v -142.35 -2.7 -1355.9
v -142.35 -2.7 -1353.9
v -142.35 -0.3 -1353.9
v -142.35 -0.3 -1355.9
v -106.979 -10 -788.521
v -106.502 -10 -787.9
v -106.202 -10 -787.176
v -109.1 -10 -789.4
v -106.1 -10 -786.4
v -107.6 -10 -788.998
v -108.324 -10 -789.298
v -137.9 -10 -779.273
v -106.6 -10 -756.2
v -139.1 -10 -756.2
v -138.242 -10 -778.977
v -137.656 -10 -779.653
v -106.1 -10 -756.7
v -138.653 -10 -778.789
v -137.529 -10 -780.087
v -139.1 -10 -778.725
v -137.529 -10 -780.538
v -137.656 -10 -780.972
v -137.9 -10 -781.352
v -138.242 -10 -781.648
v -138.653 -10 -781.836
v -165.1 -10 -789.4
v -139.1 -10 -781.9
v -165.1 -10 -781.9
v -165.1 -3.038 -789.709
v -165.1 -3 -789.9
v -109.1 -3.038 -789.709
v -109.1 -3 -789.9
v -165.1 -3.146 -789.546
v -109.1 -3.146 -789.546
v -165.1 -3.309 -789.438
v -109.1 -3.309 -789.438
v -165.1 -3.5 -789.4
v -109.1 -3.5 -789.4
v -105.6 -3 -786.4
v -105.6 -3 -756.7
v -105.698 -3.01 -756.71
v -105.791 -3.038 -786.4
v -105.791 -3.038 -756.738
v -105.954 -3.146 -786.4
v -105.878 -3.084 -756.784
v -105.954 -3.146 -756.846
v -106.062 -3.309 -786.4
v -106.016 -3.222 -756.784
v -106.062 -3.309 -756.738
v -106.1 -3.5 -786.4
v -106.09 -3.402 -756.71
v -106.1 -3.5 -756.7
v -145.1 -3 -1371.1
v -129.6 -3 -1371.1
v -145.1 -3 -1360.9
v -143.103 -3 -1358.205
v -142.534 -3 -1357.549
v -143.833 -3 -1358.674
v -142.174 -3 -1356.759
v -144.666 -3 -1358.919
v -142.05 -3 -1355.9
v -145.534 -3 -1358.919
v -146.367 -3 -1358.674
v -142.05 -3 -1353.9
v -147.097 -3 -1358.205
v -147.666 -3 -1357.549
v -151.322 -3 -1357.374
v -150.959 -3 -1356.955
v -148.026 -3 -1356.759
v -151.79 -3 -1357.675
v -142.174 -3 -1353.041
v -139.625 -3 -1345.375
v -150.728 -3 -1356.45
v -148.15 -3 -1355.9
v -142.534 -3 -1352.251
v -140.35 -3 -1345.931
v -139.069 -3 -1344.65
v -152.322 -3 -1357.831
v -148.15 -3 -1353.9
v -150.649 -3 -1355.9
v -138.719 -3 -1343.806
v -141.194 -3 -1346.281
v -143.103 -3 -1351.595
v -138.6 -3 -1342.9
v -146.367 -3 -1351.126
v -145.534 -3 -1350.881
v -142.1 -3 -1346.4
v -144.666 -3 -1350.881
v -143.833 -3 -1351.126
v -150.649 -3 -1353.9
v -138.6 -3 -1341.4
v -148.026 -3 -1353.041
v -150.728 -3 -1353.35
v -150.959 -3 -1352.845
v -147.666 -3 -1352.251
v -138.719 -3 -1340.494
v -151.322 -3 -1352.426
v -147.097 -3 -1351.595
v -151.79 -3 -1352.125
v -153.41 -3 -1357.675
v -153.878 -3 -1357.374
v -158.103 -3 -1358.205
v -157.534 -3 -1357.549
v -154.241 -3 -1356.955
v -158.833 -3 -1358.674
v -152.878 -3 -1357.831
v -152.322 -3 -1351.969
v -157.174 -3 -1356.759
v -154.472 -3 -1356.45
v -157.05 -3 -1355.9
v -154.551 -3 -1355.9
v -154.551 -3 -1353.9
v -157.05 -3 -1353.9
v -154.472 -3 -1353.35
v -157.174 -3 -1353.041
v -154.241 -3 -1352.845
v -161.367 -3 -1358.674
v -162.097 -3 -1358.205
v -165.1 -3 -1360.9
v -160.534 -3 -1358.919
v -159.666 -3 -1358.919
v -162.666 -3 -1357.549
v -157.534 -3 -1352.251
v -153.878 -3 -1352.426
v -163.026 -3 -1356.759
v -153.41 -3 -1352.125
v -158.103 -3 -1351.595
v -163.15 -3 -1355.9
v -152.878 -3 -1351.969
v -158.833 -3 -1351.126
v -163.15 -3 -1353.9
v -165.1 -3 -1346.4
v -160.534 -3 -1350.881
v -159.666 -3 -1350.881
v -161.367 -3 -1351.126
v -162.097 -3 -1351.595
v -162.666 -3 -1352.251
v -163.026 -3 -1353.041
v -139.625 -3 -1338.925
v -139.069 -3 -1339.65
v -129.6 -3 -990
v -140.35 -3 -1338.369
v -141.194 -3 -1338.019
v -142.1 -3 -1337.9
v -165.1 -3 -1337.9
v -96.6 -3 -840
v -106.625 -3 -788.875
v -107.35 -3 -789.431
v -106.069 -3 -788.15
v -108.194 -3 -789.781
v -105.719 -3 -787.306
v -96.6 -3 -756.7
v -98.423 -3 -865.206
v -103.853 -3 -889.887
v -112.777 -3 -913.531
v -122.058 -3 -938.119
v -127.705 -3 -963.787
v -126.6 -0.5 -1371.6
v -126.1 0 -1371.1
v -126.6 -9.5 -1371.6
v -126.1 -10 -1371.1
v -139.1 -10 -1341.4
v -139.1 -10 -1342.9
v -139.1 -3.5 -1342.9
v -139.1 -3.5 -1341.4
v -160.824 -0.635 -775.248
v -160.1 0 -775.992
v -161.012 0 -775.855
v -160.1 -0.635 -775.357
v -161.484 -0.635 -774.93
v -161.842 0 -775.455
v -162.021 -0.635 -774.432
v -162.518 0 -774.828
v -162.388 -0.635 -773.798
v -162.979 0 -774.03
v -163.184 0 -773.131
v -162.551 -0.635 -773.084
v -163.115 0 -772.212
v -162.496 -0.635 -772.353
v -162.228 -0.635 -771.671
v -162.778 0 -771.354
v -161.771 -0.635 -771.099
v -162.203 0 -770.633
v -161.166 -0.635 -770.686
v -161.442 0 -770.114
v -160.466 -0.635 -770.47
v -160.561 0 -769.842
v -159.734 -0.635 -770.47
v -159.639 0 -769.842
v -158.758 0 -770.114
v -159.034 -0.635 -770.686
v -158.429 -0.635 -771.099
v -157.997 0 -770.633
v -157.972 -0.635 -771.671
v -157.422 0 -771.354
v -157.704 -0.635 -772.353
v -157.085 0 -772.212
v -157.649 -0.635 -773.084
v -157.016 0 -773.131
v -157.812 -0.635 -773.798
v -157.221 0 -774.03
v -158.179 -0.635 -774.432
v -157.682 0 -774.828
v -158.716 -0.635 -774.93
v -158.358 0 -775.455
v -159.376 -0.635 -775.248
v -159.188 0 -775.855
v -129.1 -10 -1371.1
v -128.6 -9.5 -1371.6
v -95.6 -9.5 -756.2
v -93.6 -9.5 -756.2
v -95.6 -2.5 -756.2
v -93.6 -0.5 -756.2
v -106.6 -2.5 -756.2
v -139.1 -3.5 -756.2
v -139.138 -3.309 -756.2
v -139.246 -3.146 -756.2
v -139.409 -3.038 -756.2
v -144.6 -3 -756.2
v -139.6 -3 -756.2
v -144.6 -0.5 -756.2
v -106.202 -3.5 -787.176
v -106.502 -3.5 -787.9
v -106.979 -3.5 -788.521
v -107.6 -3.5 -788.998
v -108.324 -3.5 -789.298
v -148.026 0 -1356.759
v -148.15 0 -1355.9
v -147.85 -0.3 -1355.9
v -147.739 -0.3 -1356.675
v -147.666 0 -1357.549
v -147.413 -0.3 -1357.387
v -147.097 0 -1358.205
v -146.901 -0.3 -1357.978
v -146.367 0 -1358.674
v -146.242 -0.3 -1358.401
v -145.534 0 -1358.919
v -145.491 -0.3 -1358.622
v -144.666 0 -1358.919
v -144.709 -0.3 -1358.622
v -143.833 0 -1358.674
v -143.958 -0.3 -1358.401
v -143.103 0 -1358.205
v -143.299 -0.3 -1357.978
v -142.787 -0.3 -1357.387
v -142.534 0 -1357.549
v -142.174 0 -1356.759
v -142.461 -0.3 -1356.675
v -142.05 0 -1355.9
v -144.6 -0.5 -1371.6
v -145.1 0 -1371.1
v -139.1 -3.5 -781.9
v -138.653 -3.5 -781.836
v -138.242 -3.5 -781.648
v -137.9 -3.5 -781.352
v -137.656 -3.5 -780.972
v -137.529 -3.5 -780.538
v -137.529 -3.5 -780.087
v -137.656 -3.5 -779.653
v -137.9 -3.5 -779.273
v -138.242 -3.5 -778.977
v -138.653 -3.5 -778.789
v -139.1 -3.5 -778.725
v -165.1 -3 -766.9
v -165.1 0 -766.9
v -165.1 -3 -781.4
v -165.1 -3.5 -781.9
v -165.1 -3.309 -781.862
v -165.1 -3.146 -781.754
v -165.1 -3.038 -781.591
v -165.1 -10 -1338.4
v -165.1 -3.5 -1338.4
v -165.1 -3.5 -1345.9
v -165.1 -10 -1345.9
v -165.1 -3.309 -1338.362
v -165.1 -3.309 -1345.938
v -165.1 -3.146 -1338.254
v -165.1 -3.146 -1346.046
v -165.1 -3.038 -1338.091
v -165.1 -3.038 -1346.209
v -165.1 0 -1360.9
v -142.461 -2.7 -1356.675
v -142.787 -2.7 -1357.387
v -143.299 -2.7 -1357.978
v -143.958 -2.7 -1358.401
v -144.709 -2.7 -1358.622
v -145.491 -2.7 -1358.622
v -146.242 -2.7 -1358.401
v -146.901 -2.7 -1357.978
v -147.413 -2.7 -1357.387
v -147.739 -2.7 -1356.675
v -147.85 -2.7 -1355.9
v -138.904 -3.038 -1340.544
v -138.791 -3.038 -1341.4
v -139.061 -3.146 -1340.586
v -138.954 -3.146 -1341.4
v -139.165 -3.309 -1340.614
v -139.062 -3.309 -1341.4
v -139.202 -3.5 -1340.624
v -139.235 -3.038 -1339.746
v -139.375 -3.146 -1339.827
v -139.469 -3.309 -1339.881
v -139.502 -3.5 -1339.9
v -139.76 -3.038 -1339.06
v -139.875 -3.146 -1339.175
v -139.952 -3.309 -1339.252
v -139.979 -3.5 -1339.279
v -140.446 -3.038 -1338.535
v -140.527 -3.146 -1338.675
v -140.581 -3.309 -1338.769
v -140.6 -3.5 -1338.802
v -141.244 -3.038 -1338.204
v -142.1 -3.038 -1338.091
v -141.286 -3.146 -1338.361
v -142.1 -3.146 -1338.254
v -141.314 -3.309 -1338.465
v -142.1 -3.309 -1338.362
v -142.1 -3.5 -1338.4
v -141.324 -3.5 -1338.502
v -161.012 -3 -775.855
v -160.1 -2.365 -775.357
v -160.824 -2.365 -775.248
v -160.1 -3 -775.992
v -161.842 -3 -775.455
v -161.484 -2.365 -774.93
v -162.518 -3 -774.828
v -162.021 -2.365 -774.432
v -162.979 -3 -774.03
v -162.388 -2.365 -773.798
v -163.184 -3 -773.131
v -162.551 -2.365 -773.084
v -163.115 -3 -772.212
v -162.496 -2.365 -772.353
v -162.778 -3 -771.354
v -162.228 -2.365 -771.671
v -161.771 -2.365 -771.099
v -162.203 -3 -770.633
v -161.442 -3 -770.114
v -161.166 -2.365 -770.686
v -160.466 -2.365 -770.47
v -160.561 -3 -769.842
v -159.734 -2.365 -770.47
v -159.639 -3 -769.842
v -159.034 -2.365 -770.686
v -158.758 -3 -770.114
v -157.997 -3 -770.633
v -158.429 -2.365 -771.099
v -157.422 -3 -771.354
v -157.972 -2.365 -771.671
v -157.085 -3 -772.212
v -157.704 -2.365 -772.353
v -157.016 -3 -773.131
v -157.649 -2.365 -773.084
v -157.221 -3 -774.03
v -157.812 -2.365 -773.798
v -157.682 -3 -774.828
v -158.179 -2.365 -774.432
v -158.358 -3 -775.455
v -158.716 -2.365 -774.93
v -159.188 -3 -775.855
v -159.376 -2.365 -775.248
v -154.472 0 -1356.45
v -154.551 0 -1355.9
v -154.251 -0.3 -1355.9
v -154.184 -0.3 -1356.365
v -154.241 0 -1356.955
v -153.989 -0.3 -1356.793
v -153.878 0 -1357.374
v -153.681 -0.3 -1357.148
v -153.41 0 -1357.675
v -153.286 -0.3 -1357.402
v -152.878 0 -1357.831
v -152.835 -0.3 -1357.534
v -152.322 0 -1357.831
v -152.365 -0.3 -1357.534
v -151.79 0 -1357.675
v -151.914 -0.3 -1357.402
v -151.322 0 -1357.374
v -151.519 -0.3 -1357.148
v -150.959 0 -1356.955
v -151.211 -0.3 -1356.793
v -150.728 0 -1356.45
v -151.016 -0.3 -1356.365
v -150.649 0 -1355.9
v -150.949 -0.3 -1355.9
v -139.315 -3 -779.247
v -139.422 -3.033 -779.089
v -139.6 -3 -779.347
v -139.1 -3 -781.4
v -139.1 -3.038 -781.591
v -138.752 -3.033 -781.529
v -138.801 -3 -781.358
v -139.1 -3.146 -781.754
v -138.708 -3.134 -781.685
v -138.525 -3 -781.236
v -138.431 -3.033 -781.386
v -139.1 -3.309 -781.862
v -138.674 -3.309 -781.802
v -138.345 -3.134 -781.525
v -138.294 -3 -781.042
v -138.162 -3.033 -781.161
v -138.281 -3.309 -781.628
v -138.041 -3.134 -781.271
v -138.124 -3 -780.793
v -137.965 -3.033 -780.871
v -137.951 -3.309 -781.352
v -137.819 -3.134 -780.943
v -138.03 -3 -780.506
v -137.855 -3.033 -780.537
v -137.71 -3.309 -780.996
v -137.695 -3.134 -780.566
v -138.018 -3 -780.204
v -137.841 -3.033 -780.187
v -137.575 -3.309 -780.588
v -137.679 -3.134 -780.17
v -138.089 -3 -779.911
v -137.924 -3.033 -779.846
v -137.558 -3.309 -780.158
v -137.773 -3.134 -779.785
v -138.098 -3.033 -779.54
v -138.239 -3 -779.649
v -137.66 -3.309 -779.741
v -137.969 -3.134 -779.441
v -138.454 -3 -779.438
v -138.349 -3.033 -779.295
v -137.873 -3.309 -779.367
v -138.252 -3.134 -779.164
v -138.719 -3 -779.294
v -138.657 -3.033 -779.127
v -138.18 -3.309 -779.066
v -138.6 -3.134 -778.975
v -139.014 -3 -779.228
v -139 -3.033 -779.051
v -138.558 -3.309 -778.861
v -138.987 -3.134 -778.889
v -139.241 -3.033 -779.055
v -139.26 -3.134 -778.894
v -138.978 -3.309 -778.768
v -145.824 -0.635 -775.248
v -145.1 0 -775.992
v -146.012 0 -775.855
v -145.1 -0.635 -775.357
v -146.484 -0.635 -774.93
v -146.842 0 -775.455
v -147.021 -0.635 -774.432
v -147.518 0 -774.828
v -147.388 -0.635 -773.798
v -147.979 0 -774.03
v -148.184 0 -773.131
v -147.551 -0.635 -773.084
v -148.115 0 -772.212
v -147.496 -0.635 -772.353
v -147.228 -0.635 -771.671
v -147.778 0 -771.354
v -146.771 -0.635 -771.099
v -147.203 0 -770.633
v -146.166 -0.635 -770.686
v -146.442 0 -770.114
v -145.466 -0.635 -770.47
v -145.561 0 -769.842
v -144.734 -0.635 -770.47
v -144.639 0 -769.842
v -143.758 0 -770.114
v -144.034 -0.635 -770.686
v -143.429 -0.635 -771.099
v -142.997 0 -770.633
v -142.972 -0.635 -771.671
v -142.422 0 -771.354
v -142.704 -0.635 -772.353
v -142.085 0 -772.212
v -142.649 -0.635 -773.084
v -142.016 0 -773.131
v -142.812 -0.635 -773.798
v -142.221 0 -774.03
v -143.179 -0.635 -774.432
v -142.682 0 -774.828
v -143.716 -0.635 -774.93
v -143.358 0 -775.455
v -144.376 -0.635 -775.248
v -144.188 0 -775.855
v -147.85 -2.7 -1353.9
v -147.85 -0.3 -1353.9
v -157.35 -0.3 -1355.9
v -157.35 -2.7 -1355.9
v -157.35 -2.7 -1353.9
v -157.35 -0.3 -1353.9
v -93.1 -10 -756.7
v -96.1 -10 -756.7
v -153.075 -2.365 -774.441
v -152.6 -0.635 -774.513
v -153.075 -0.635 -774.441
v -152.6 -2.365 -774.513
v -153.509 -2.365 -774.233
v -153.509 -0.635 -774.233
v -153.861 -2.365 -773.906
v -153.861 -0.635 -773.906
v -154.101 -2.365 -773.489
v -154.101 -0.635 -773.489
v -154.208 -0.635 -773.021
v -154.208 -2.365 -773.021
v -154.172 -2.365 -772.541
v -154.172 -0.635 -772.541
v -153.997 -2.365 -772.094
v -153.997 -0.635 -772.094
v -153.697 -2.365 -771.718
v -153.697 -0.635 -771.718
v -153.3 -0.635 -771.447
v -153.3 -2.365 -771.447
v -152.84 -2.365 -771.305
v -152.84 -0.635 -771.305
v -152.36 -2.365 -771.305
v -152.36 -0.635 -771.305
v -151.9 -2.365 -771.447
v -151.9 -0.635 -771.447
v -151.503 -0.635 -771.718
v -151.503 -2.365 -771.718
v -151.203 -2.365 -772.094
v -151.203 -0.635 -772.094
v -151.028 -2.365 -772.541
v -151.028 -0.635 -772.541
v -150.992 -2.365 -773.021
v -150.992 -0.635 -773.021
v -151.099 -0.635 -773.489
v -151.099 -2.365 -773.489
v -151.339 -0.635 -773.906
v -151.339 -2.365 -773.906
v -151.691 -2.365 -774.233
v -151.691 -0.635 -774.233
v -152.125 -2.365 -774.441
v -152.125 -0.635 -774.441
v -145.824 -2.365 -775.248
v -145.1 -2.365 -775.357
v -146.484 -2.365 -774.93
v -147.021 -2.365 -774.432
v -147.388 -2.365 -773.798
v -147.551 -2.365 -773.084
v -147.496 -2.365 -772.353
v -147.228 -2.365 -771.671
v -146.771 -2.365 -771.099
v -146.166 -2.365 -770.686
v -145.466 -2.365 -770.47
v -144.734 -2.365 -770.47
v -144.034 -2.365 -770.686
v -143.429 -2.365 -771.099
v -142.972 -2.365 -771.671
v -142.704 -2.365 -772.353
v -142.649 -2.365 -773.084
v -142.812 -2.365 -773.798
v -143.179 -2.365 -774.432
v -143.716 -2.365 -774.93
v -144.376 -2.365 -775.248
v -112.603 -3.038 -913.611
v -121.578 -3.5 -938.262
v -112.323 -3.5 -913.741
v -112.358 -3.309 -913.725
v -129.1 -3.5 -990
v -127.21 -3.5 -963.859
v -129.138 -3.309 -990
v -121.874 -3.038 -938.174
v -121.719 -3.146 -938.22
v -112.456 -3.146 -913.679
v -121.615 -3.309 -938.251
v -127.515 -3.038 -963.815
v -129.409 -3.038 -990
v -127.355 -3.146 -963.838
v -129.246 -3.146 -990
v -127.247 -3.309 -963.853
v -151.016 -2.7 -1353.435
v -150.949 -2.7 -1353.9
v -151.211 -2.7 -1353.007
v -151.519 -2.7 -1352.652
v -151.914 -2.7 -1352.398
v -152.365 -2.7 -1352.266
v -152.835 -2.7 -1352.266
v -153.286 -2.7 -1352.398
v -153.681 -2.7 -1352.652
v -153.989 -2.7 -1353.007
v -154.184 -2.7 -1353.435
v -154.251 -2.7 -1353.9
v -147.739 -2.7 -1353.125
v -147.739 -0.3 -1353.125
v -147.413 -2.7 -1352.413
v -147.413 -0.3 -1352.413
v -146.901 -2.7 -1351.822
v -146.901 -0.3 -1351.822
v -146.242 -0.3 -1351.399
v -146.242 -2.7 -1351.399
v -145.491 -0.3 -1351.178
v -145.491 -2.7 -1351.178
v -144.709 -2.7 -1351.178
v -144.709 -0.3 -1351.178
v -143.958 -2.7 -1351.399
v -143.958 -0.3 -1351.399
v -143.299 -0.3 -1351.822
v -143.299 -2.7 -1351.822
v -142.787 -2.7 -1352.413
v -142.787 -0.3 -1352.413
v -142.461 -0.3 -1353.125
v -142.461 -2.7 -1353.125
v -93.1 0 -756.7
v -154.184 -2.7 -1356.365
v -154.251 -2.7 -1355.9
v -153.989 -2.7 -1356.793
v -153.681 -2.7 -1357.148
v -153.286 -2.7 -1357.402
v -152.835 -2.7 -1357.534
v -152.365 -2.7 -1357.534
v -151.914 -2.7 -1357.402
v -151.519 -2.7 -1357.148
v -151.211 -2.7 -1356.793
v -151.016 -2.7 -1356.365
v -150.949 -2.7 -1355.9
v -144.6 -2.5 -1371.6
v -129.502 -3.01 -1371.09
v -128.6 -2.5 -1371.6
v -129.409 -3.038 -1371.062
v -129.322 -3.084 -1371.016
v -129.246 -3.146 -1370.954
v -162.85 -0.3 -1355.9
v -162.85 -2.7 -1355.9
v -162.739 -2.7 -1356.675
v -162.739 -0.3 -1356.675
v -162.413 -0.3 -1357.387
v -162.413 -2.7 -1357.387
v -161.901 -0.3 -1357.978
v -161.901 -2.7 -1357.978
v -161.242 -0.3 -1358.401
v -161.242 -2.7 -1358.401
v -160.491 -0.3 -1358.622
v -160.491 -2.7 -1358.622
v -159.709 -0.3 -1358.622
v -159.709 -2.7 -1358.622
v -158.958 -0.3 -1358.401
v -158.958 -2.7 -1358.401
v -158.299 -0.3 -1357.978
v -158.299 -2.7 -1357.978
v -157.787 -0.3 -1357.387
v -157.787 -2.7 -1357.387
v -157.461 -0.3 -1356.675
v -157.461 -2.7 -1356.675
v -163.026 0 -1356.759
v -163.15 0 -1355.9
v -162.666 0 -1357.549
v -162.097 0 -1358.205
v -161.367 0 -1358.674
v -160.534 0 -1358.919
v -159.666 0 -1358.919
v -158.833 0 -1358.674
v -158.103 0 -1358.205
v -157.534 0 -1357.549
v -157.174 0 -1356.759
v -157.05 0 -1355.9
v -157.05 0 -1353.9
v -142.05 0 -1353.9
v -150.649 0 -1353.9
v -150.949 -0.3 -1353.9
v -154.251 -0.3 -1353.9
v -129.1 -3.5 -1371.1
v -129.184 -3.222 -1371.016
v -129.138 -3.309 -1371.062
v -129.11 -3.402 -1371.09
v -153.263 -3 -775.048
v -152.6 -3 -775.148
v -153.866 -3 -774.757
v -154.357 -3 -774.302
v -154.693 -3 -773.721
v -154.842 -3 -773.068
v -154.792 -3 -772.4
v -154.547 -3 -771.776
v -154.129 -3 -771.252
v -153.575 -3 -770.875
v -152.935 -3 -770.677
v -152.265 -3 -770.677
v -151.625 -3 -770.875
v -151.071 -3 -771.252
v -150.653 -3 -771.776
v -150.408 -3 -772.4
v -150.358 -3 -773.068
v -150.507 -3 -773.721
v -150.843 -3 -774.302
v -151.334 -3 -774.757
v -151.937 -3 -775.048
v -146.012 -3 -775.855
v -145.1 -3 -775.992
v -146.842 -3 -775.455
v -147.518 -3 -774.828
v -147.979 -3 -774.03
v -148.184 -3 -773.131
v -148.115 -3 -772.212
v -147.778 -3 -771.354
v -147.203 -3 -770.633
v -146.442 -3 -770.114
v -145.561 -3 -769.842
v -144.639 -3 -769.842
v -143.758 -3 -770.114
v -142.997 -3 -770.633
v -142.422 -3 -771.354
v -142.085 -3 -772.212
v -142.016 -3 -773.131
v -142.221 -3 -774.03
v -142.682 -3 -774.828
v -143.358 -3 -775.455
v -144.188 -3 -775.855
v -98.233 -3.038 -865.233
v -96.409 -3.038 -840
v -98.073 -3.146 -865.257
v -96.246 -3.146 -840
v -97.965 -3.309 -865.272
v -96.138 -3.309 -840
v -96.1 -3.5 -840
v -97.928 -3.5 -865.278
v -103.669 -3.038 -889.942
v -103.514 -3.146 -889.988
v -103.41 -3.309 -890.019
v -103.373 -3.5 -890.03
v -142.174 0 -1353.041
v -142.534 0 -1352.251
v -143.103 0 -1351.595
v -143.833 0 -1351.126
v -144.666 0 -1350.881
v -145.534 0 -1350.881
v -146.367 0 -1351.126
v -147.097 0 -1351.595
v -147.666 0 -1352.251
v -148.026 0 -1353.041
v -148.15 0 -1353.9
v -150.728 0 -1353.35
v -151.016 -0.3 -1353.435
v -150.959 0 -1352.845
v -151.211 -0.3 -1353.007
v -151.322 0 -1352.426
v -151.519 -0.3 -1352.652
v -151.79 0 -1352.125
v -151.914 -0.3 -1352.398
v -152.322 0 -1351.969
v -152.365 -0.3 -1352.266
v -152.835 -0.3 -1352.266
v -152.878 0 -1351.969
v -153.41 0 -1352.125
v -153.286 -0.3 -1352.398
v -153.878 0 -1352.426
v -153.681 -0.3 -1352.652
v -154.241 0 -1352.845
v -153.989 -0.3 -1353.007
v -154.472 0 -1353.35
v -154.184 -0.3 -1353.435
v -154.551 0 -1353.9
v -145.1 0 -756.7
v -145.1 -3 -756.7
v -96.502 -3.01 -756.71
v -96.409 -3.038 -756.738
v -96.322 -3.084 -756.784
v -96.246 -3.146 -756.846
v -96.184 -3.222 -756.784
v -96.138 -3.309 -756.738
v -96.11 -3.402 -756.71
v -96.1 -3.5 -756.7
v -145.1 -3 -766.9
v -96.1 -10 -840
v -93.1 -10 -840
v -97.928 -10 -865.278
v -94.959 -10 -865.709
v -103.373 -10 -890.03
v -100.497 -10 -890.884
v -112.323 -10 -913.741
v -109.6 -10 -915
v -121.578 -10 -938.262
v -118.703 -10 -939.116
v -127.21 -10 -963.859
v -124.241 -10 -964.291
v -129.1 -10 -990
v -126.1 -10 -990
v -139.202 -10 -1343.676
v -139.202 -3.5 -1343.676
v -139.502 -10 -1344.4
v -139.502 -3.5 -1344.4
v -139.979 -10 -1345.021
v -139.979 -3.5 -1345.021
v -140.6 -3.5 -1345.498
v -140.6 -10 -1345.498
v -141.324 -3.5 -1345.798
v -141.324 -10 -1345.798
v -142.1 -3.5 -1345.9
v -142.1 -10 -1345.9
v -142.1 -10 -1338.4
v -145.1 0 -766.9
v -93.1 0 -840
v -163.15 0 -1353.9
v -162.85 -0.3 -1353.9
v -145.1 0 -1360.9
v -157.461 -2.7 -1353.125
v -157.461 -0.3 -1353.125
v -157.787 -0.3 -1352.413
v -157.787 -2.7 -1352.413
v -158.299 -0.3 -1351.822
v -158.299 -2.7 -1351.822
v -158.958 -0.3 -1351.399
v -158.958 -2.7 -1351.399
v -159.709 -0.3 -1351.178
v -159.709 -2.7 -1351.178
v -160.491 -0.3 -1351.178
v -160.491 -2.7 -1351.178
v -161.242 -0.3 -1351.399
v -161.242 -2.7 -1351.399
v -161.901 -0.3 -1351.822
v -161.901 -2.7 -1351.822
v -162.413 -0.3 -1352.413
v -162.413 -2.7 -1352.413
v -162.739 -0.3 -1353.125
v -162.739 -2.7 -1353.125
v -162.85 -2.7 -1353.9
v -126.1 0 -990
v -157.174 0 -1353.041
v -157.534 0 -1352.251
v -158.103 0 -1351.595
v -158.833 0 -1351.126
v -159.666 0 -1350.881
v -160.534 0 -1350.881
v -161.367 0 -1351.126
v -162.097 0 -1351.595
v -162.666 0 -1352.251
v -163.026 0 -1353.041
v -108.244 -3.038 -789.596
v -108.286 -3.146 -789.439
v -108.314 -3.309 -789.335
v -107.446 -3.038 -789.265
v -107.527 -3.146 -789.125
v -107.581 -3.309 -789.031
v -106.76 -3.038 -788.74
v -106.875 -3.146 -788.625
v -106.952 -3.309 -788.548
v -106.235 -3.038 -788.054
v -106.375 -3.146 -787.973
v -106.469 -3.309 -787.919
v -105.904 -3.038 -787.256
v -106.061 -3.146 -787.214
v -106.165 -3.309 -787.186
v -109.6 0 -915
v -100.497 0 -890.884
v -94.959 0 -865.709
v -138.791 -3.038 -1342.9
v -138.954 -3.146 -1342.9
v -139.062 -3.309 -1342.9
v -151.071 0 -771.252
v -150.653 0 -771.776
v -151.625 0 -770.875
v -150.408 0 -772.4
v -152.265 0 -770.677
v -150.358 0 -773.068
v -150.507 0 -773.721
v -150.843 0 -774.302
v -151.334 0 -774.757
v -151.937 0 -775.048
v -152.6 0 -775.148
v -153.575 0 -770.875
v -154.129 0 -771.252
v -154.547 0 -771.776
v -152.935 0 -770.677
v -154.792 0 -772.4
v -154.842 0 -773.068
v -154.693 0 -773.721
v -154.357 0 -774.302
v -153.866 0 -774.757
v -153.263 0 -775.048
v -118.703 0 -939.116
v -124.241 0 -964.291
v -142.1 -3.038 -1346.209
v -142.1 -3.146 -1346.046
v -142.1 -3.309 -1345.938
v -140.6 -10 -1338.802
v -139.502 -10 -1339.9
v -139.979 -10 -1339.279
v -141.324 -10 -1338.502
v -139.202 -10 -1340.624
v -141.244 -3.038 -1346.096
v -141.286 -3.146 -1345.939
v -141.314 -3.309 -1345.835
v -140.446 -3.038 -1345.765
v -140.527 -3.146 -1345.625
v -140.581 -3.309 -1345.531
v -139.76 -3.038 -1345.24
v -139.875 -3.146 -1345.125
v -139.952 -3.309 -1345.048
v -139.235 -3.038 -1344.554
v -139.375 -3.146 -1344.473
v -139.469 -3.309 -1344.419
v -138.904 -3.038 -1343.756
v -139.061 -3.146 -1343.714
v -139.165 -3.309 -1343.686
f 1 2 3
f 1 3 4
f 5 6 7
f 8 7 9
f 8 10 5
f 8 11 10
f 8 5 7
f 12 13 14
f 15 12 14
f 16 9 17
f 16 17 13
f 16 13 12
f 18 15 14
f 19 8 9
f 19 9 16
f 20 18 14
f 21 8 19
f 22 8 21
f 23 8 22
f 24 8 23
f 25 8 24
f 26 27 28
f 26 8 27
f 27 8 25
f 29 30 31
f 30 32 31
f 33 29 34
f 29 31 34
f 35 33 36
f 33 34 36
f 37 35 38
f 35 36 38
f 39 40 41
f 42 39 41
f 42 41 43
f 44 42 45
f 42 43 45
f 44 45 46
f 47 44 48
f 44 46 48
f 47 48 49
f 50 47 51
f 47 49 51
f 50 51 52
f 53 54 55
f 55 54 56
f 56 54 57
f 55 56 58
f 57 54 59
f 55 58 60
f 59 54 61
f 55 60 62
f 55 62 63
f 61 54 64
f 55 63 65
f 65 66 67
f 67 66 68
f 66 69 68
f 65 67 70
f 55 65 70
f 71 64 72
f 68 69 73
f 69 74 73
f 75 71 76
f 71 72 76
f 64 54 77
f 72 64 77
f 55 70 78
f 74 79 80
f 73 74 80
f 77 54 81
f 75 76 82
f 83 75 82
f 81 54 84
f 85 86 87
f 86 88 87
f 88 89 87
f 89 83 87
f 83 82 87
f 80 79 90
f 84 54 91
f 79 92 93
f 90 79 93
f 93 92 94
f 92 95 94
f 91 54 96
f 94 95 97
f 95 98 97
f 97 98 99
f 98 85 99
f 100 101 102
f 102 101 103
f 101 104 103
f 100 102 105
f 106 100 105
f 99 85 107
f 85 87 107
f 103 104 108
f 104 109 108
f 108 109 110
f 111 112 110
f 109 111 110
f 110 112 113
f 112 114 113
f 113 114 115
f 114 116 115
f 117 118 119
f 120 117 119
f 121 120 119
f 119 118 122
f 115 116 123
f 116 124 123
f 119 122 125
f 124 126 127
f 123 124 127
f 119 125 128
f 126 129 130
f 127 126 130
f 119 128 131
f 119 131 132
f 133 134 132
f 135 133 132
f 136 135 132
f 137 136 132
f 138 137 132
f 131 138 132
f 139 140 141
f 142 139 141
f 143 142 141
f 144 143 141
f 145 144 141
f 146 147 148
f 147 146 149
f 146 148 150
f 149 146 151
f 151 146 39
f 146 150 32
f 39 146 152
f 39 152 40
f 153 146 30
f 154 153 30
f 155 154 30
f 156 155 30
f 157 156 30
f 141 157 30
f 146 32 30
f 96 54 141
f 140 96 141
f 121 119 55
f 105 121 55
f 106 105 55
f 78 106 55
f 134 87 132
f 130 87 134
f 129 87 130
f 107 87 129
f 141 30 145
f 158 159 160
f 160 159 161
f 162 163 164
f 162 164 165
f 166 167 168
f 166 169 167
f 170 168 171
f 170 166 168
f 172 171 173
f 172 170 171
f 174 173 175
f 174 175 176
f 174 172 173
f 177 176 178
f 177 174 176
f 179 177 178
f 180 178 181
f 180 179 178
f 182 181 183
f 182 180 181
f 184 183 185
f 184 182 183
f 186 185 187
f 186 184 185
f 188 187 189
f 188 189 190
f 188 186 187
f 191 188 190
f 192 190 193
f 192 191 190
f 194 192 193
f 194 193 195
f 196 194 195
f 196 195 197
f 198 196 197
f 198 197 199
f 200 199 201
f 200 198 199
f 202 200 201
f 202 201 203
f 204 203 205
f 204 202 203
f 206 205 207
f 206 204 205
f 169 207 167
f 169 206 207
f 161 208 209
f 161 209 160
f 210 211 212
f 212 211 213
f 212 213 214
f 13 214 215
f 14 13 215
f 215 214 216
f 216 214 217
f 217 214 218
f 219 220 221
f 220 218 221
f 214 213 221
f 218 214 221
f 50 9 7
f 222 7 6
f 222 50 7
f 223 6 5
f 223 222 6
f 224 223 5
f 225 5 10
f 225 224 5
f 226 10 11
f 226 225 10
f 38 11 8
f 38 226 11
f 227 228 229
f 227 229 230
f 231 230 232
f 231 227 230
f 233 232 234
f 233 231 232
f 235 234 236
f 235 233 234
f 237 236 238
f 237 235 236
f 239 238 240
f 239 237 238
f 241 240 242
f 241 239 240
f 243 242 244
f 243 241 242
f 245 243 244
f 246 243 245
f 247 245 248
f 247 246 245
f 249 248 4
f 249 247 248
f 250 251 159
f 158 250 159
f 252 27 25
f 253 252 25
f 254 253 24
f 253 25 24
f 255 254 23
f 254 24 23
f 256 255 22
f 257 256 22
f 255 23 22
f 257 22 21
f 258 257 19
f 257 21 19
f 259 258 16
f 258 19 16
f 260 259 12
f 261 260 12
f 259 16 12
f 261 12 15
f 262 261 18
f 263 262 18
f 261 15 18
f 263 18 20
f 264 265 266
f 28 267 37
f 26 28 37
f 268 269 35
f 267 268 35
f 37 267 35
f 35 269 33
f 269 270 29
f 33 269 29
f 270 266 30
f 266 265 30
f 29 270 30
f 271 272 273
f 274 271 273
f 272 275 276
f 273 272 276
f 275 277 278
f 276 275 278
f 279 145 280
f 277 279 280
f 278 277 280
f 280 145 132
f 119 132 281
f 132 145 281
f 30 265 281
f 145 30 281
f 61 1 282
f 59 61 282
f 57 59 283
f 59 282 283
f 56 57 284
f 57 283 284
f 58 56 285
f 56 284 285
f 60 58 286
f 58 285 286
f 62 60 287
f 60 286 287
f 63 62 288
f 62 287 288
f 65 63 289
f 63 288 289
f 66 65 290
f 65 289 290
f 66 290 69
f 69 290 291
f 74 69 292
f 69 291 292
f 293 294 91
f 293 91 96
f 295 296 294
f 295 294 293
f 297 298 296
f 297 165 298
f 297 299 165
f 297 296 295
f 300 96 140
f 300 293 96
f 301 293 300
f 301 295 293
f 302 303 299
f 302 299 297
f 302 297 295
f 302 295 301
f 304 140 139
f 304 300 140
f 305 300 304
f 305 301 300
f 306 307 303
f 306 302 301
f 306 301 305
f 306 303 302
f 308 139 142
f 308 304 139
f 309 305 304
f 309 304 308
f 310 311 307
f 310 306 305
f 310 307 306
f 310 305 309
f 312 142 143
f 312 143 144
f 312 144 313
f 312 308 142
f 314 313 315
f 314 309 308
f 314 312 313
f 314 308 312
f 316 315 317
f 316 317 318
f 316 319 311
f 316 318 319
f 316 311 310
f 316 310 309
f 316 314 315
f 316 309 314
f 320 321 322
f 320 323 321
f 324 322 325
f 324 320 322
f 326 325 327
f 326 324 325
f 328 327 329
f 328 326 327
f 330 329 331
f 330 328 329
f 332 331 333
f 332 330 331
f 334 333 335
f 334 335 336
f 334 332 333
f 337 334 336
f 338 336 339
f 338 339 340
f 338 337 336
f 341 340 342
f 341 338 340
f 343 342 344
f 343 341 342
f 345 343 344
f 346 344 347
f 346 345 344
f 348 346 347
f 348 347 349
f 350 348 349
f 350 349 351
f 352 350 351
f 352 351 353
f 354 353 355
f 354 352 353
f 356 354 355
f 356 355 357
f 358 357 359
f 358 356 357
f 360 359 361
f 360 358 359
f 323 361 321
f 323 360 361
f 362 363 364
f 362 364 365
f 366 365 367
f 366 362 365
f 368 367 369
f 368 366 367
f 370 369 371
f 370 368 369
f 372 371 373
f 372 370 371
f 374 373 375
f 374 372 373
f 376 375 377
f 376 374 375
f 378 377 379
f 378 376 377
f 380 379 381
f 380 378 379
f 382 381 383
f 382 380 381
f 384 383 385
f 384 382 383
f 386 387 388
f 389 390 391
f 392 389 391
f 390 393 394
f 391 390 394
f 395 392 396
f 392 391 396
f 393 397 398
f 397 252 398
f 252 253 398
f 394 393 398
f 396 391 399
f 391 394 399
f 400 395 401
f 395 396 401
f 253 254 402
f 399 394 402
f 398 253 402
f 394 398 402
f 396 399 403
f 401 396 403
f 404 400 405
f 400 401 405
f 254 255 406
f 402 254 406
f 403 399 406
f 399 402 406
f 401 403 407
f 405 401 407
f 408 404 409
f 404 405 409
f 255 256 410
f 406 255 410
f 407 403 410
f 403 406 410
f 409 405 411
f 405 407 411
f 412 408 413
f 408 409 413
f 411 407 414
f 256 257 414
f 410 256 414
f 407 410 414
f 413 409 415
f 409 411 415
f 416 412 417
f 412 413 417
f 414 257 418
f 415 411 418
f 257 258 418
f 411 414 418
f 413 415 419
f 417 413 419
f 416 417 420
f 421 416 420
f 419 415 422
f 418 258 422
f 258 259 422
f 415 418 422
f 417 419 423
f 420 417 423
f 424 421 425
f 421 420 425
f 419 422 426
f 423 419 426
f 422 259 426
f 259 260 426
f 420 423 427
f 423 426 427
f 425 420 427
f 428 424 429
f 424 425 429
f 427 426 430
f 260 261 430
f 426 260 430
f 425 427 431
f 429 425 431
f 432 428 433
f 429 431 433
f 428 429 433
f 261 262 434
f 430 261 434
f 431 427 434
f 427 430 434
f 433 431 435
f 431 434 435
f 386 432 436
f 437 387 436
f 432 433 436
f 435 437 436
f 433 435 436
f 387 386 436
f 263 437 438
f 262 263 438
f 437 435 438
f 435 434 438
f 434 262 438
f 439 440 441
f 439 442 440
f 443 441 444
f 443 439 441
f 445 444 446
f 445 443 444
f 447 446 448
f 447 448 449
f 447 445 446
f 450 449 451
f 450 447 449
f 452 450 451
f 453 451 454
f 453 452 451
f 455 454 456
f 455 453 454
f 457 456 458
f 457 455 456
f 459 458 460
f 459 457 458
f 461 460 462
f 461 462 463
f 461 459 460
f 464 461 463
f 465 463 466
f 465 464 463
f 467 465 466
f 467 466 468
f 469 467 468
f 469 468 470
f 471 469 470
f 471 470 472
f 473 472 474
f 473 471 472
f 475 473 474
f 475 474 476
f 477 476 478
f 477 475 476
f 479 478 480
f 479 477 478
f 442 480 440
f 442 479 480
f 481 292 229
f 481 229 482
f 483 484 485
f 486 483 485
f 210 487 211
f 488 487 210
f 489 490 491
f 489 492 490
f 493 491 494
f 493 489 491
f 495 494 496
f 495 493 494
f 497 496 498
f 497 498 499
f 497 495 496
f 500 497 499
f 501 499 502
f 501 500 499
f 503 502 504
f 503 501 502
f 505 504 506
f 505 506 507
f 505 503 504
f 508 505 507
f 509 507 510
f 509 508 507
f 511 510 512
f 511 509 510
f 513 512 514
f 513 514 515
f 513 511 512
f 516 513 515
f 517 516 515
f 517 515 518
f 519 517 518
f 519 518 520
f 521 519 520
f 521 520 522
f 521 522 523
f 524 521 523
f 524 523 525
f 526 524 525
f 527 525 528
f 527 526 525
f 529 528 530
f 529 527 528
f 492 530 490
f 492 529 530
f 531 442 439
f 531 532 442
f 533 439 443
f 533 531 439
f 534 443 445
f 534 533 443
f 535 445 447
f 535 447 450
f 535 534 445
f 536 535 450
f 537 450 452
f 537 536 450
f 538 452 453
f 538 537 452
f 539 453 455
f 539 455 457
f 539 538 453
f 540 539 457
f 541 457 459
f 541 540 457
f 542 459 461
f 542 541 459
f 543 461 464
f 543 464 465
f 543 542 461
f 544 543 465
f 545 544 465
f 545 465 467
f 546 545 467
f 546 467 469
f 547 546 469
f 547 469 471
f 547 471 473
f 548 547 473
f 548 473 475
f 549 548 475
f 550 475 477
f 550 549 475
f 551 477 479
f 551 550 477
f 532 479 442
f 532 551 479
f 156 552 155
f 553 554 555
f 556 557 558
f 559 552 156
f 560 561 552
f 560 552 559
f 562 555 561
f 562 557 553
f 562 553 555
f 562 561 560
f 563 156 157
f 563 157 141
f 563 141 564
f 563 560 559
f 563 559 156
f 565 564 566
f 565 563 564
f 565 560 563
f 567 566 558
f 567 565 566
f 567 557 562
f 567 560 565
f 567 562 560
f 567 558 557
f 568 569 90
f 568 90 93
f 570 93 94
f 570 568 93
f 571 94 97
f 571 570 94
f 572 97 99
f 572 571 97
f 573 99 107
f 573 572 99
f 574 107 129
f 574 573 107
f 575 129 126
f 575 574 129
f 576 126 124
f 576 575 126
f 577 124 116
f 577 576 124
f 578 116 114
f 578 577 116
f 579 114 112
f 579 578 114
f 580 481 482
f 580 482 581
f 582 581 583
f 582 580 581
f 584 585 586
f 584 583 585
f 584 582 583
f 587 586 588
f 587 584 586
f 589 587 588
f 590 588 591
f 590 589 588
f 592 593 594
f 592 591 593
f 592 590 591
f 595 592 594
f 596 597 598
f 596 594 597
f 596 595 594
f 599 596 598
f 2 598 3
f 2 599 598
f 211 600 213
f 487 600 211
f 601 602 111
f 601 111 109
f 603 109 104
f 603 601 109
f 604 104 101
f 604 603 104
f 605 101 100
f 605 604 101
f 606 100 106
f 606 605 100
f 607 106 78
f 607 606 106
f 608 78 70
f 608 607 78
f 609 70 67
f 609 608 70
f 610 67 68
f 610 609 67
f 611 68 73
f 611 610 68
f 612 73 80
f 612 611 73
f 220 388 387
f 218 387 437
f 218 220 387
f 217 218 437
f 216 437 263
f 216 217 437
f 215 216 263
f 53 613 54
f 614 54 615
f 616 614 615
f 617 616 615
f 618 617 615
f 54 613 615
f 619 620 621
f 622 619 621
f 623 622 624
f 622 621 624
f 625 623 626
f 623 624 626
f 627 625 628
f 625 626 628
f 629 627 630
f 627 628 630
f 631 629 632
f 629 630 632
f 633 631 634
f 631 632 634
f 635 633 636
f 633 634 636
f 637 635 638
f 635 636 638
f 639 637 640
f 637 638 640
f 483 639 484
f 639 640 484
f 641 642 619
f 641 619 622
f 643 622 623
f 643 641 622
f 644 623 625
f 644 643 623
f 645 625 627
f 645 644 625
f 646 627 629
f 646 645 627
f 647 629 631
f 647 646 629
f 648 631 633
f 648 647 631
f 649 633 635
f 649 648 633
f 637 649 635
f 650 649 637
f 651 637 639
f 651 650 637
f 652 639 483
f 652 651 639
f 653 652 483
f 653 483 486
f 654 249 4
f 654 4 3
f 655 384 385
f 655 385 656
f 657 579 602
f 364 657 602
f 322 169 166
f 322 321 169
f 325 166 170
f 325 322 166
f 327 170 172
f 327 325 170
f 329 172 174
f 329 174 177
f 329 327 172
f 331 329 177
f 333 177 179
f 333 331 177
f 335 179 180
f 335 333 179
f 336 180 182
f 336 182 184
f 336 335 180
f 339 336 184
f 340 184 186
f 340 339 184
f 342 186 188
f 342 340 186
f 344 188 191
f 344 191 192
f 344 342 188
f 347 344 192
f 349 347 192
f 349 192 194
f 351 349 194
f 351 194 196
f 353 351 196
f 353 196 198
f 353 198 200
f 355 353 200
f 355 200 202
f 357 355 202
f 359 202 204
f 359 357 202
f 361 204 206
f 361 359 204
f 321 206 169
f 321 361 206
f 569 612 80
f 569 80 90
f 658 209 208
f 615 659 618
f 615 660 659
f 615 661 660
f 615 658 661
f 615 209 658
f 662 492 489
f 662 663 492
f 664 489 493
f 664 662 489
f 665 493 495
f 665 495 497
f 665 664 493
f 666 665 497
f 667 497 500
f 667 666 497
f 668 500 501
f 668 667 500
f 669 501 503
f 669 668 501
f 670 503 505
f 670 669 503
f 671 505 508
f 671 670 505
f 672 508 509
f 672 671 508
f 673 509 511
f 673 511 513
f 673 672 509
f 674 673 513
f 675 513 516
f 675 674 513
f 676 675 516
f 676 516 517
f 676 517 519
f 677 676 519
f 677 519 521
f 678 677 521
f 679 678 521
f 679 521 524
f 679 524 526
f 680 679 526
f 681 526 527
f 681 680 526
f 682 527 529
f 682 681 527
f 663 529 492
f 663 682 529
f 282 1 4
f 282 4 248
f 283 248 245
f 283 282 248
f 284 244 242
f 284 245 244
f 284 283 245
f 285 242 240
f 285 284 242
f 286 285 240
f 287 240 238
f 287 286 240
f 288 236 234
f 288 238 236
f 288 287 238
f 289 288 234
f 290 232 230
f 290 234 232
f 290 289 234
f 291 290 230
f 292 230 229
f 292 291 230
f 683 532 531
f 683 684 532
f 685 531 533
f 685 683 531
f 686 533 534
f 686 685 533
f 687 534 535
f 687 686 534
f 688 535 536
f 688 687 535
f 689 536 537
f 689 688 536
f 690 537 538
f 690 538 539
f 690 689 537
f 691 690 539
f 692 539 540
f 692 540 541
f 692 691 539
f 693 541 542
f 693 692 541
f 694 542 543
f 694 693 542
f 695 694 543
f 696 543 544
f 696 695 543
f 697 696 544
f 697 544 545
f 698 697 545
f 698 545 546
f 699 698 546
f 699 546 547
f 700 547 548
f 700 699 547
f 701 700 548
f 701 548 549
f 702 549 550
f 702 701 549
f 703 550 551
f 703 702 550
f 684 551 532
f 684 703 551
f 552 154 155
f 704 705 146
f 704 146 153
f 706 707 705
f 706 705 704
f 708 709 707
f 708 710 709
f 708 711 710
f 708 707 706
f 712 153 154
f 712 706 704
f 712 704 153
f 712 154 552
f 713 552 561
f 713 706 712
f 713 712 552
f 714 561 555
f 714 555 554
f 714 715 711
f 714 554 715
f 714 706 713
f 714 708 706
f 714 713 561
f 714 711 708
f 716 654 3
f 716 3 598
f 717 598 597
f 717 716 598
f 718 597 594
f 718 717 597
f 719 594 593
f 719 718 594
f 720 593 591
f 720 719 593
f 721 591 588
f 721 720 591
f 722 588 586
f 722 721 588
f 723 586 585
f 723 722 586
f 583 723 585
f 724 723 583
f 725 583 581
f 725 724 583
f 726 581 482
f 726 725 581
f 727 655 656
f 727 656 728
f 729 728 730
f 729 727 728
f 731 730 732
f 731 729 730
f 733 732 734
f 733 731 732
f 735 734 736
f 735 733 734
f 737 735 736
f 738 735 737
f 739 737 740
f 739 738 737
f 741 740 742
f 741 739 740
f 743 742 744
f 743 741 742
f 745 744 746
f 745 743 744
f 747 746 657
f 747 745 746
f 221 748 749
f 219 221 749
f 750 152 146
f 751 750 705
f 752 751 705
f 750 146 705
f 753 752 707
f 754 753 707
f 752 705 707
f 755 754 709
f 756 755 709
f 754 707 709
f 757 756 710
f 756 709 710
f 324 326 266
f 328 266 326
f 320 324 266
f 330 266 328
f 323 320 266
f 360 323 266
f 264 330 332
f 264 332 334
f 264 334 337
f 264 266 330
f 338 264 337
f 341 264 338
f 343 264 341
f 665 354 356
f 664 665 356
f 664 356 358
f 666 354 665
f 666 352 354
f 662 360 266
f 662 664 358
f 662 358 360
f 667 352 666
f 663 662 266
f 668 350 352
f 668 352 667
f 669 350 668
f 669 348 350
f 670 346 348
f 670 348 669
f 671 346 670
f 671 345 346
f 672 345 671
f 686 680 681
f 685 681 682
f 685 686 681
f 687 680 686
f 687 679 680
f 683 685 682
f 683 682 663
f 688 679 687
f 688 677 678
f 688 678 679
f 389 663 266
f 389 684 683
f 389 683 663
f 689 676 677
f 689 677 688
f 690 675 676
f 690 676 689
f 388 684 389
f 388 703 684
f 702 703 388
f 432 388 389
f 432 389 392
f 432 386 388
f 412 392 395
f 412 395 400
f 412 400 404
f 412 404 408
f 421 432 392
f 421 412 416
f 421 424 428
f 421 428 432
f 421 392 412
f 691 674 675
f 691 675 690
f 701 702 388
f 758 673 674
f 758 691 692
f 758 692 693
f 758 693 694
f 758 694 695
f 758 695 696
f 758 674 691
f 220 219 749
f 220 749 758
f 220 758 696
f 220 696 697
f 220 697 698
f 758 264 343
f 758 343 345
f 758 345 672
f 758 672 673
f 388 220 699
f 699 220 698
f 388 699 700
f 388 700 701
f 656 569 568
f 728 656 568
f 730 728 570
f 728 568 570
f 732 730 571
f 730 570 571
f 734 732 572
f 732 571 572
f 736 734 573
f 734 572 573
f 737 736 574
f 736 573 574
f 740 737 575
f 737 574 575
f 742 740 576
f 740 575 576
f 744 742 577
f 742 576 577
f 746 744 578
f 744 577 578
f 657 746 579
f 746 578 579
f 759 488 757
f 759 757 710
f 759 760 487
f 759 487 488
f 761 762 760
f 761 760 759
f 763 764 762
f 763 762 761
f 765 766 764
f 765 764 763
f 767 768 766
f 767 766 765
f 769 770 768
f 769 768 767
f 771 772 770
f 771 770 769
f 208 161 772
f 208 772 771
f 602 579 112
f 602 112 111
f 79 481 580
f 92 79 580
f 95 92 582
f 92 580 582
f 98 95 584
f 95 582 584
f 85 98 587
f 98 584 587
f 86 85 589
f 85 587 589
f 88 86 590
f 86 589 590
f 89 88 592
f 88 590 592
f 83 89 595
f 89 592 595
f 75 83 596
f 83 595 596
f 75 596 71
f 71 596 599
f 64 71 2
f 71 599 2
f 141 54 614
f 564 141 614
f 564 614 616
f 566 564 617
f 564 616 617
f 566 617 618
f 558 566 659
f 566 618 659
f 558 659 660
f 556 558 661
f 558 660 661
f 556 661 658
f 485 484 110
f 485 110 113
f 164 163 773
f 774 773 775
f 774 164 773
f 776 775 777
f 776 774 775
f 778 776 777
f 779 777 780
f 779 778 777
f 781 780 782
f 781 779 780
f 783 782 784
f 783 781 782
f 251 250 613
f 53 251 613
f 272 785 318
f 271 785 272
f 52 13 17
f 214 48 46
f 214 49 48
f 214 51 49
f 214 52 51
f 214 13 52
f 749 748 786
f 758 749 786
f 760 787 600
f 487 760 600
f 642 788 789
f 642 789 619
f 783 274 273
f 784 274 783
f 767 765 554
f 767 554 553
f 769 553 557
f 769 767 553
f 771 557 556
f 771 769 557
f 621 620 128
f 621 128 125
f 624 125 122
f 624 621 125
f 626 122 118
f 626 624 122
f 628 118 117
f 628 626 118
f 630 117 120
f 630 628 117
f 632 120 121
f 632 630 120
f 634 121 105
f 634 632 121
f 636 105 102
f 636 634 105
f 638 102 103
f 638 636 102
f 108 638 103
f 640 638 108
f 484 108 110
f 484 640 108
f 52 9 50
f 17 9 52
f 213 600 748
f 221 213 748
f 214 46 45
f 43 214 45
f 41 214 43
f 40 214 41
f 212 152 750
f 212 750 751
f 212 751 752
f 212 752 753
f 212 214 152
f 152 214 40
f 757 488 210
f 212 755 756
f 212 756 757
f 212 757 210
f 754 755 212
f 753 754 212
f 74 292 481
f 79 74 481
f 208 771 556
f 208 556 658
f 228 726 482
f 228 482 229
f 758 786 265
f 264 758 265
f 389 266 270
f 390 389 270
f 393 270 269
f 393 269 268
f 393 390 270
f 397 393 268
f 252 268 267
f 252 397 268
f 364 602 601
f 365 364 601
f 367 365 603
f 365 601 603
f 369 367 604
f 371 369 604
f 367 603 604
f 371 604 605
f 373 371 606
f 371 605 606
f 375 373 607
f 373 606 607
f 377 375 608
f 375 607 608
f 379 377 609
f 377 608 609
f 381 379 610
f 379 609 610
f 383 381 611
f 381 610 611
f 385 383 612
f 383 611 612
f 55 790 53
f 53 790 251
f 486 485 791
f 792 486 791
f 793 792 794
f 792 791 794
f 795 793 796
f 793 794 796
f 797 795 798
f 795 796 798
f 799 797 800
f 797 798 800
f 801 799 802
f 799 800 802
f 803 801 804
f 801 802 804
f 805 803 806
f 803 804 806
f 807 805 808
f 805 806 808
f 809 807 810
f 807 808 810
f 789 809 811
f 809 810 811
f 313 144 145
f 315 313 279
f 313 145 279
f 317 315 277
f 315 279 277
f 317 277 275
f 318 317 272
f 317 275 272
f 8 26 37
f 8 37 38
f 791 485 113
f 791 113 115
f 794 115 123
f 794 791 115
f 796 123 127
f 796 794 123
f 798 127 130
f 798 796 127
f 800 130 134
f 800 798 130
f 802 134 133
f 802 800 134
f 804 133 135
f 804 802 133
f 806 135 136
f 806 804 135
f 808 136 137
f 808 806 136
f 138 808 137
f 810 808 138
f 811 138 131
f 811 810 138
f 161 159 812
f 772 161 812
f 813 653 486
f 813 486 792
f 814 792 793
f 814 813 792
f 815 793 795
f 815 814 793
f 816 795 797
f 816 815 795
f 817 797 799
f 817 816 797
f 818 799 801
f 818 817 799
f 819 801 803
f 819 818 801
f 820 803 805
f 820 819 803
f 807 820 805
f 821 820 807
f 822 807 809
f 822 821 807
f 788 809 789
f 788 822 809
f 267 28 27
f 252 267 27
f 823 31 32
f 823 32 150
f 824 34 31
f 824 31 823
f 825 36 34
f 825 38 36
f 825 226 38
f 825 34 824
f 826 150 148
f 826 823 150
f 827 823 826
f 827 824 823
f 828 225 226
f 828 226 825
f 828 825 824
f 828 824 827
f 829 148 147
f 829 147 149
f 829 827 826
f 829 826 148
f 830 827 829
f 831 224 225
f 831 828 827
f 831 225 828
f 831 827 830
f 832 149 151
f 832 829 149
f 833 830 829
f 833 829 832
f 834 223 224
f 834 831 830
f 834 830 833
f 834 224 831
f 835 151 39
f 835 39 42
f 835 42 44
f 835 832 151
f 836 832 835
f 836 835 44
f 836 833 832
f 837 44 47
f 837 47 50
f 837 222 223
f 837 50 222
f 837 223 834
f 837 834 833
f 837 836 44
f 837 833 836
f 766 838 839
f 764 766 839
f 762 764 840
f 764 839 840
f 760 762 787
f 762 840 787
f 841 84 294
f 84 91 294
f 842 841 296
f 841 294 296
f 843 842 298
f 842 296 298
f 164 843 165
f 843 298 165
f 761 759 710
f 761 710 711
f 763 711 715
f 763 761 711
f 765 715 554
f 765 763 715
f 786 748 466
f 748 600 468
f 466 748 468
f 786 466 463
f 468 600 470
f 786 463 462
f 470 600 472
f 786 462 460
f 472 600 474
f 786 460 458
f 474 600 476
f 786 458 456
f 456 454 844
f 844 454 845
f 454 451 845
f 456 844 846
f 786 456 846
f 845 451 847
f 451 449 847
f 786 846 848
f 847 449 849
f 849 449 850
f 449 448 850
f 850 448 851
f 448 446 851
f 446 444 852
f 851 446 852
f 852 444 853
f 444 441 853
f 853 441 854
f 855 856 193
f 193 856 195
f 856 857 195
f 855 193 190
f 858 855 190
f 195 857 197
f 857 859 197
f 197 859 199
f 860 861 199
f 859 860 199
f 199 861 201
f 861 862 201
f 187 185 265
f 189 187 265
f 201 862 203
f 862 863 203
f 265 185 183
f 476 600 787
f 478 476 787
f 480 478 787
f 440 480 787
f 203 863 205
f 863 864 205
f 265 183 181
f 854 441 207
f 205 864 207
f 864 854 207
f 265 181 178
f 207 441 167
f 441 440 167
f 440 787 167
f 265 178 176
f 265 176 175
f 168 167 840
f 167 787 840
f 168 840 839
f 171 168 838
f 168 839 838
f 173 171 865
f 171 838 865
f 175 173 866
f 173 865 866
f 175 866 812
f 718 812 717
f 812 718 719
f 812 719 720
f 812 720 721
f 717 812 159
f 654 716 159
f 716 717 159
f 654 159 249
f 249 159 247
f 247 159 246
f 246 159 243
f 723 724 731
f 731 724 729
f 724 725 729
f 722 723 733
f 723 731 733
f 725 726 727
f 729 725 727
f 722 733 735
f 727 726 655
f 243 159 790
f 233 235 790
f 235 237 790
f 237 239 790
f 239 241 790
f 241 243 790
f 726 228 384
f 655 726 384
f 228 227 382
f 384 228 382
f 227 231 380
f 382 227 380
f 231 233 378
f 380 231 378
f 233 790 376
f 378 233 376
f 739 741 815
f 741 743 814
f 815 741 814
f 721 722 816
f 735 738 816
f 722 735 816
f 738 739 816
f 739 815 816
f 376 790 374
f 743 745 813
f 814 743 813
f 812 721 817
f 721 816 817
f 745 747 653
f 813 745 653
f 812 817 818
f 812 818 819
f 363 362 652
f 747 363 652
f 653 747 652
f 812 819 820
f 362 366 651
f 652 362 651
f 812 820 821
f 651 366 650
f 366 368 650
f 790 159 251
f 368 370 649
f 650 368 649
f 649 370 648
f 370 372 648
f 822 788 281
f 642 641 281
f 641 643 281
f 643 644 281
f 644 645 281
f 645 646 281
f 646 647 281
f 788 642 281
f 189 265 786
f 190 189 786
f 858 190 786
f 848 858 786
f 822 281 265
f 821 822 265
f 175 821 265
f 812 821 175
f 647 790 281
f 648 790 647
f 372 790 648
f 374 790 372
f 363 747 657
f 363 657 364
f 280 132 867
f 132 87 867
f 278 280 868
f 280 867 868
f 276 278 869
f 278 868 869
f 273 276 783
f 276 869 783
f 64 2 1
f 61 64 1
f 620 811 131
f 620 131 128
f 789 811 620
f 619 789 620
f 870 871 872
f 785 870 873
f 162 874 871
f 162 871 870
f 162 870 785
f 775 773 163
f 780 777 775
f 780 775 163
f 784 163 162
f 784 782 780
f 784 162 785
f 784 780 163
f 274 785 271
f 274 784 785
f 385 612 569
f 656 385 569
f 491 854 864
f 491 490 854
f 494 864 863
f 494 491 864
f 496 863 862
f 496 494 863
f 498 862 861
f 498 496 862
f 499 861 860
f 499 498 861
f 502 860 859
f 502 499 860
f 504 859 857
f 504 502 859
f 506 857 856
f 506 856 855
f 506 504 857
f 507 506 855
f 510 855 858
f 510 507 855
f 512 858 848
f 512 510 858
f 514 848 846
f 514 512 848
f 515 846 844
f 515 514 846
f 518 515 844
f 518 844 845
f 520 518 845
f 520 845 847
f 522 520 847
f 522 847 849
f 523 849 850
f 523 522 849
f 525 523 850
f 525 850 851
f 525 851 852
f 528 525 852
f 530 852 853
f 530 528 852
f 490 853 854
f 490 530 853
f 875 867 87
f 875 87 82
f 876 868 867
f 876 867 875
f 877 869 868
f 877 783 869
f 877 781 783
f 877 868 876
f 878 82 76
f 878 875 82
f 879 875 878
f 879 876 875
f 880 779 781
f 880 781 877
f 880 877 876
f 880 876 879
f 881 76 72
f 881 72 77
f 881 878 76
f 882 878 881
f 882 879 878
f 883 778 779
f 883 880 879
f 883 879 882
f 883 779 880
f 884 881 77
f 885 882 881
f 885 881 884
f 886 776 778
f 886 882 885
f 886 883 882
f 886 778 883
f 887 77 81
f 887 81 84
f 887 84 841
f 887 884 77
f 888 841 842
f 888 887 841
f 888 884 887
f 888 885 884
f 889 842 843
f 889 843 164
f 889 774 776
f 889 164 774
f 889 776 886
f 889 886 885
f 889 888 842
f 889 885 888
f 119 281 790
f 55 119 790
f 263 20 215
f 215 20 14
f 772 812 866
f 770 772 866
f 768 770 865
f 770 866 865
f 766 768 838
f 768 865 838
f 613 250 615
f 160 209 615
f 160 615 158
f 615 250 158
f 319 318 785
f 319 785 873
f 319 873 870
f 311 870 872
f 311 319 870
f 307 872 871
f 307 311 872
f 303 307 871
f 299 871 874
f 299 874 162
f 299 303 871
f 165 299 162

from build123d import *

# Parameters (mm, degrees)
EXTRUDE1_DEPTH                 = 10
EXTRUDE2_DEPTH                 = 7
SKETCH5_W                      = 20
SKETCH5_H                      = 15
SKETCH5_W_2                    = 26
EXTRUDE3_DEPTH                 = 7
SKETCH15_W                     = 6
SKETCH15_H                     = 10.7
SKETCH15_H_2                   = 25.7
EXTRUDE9_DEPTH                 = 7
F_8_CLEARANCE_HOLE1_AT_2_COUNT = 2
F_8_CLEARANCE_HOLE1_AT_2_PITCH = 15
EXTRUDE6_DEPTH                 = 4
SKETCH16_R                     = 1.5875
EXTRUDE10_DEPTH                = 7
CHAMFER1_SIZE                  = 0.3
CHAMFER2_SIZE                  = 0.5
CHAMFER3_SIZE                  = 0.3
FILLET3_R                      = 3
FILLET2_R                      = 0.5


with BuildPart() as part:
    # Sketch1 → Extrude1 (new body)
    with BuildSketch(Plane(origin=(0, 0, 0), x_dir=(1, 0, 0), z_dir=(0, 1, 0))):
        with BuildLine():
            Line((-93.1, 756.2), (-145.1, 756.2))
            Line((-145.1, 756.2), (-145.1, 766.9))
            Line((-145.1, 766.9), (-165.1, 766.9))
            Line((-165.1, 766.9), (-165.1, 1360.9))
            Line((-165.1, 1360.9), (-145.1, 1360.9))
            Line((-145.1, 1360.9), (-145.1, 1371.6))
            Line((-145.1, 1371.6), (-126.1, 1371.6))
            Line((-126.1, 1371.6), (-126.1, 990))
            ThreePointArc((-126.1, 990), (-121.926260039, 951.603222791), (-109.6, 915))
            ThreePointArc((-109.6, 915), (-97.273739961, 878.396777209), (-93.1, 840))
            Line((-93.1, 840), (-93.1, 756.2))
        make_face()
    extrude(amount=-EXTRUDE1_DEPTH)

    # Sketch4 → Extrude2 (cut)
    with BuildSketch(Plane.XZ.offset(10)):
        with BuildLine():
            Line((-165.1, -789.4), (-106.1, -789.4))
            Line((-106.1, -789.4), (-106.1, -756.2))
            Line((-106.1, -756.2), (-96.1, -756.2))
            Line((-96.1, -756.2), (-96.1, -840))
            ThreePointArc((-96.1, -840), (-100.203673361, -877.75219186), (-112.323006486, -913.740938573))
            ThreePointArc((-112.323006486, -913.740938573), (-124.856193439, -950.958637443), (-129.1, -990))
            Line((-129.1, -990), (-129.1, -1371.6))
            Line((-129.1, -1371.6), (-139.1, -1371.6))
            Line((-139.1, -1371.6), (-139.1, -1338.4))
            Line((-139.1, -1338.4), (-165.1, -1338.4))
            Line((-165.1, -1338.4), (-165.1, -789.4))
        make_face()
    extrude(amount=-EXTRUDE2_DEPTH, mode=Mode.SUBTRACT)

    # Sketch5 → Extrude3 (cut)
    with BuildSketch(Plane.XZ.offset(10)):
        with Locations((-155.1, -774.4)):
            Rectangle(SKETCH5_W, SKETCH5_H)
        with Locations((-152.1, -1353.4)):
            Rectangle(SKETCH5_W_2, SKETCH5_H)
    extrude(amount=-EXTRUDE3_DEPTH, mode=Mode.SUBTRACT)

    # Sketch15 → Extrude9 (cut)
    with BuildSketch(Plane.XZ.offset(10)):
        with Locations((-142.1, -1366.25)):
            Rectangle(SKETCH15_W, SKETCH15_H)
        with Locations((-142.1, -769.05)):
            Rectangle(SKETCH15_W, SKETCH15_H_2)
    extrude(amount=-EXTRUDE9_DEPTH, mode=Mode.SUBTRACT)

    # Sketch9 → 1/8 (0.125) Diameter Hole1 (revolve, cut)
    with BuildSketch(Plane(origin=(-152.6, -3, -772.9), x_dir=(0, 0, -1), z_dir=(1, 0, 0))):
        Polygon((0, 0), (0, 3), (2.2479, 3), (1.6129, 2.365), (1.6129, 0.635), (2.2479, 0), align=None)
    revolve(axis=Axis((-152.6, -9.35, -772.9), (0, 1, 0)), mode=Mode.SUBTRACT)

    # Sketch10 → #8 Clearance Hole1 (revolve, cut)
    with BuildSketch(Plane(origin=(-160.1, -3, -772.9), x_dir=(0, 0, -1), z_dir=(1, 0, 0))):
        Polygon((0, 0), (0, 3), (3.09245, 3), (2.45745, 2.365), (2.45745, 0.635), (3.09245, 0), align=None)
    f_8_clearance_hole1 = revolve(axis=Axis((-160.1, -9.35, -772.9), (0, 1, 0)), mode=Mode.SUBTRACT)

    # #8 Clearance Hole1 at 2: #8 Clearance Hole1 ×2
    with Locations(*[(i * F_8_CLEARANCE_HOLE1_AT_2_PITCH, 0, 0) for i in range(1, F_8_CLEARANCE_HOLE1_AT_2_COUNT)]):
        add(f_8_clearance_hole1, mode=Mode.SUBTRACT)

    # Sketch12 → Extrude6 (cut, through all)
    with BuildSketch(Plane.XZ.offset(3)):
        with BuildLine():
            Line((-154.251, -1353.9), (-154.251, -1355.9))
            ThreePointArc((-154.251, -1355.9), (-152.6, -1357.551), (-150.949, -1355.9))
            Line((-150.949, -1355.9), (-150.949, -1353.9))
            ThreePointArc((-150.949, -1353.9), (-152.6, -1352.249), (-154.251, -1353.9))
        make_face()
        with BuildLine():
            Line((-142.35, -1353.9), (-142.35, -1355.9))
            ThreePointArc((-142.35, -1355.9), (-145.1, -1358.65), (-147.85, -1355.9))
            Line((-147.85, -1355.9), (-147.85, -1353.9))
            ThreePointArc((-147.85, -1353.9), (-145.1, -1351.15), (-142.35, -1353.9))
        make_face()
        with BuildLine():
            Line((-162.85, -1353.9), (-162.85, -1355.9))
            ThreePointArc((-162.85, -1355.9), (-160.1, -1358.65), (-157.35, -1355.9))
            Line((-157.35, -1355.9), (-157.35, -1353.9))
            ThreePointArc((-157.35, -1353.9), (-160.1, -1351.15), (-162.85, -1353.9))
        make_face()
    extrude(amount=-EXTRUDE6_DEPTH, mode=Mode.SUBTRACT)

    # Sketch16 → Extrude10 (cut)
    with BuildSketch(Plane.XZ.offset(10)):
        with Locations((-139.1, -780.3125)):
            Circle(SKETCH16_R)
    extrude(amount=-EXTRUDE10_DEPTH, mode=Mode.SUBTRACT)

    # Chamfer1
    chamfer1_edges = [part.edges().sort_by_distance(p)[0] for p in [
        (-152.6, 0, -1352.249),
        (-150.949, 0, -1354.9),
        (-152.6, 0, -1357.551),
        (-154.251, 0, -1354.9),
        (-152.6, -3, -1352.249),
        (-154.251, -3, -1354.9),
        (-152.6, -3, -1357.551),
        (-150.949, -3, -1354.9),
    ]]
    chamfer(chamfer1_edges, length=CHAMFER1_SIZE)

    # Chamfer2
    chamfer2_edges = [part.edges().sort_by_distance(p)[0] for p in [
        (-94.6, -10, -756.2),
        (-93.1, -5, -756.2),
        (-119.1, 0, -756.2),
        (-145.1, -1.5, -756.2),
        (-106.1, -6.5, -756.2),
        (-101.1, -3, -756.2),
        (-96.1, -6.5, -756.2),
        (-126.1, -5, -1371.6),
        (-127.6, -10, -1371.6),
        (-129.1, -6.5, -1371.6),
        (-137.1, -3, -1371.6),
        (-145.1, -1.5, -1371.6),
        (-135.6, 0, -1371.6),
    ]]
    chamfer(chamfer2_edges, length=CHAMFER2_SIZE)

    # Chamfer3
    chamfer3_edges = [part.edges().sort_by_distance(p)[0] for p in [
        (-145.1, 0, -1351.15),
        (-142.35, 0, -1354.9),
        (-145.1, 0, -1358.65),
        (-147.85, 0, -1354.9),
        (-145.1, -3, -1351.15),
        (-147.85, -3, -1354.9),
        (-145.1, -3, -1358.65),
        (-142.35, -3, -1354.9),
        (-160.1, 0, -1351.15),
        (-157.35, 0, -1354.9),
        (-160.1, 0, -1358.65),
        (-162.85, 0, -1354.9),
        (-160.1, -3, -1351.15),
        (-162.85, -3, -1354.9),
        (-160.1, -3, -1358.65),
        (-157.35, -3, -1354.9),
    ]]
    chamfer(chamfer3_edges, length=CHAMFER3_SIZE)

    # Fillet3
    fillet3_edges = [part.edges().sort_by_distance(p)[0] for p in [
        (-106.1, -6.5, -789.4),
        (-139.1, -6.5, -1338.4),
        (-139.1, -6.5, -1345.9),
    ]]
    fillet(fillet3_edges, radius=FILLET3_R)

    # Fillet2
    fillet2_edges = [part.edges().sort_by_distance(p)[0] for p in [
        (-139.1, -3, -767.4625),
        (-137.5125, -3, -780.3125),
        (-96.1, -3, -798.35),
        (-139.1, -3, -1342.15),
        (-153.6, -3, -1338.4),
        (-106.1, -3, -771.55),
        (-139.978679656, -3, -1339.278679656),
        (-139.978679656, -3, -1345.021320344),
        (-106.978679656, -3, -788.521320344),
        (-137.1, -3, -789.4),
        (-100.203673361, -3, -877.75219186),
        (-124.856193439, -3, -950.958637443),
        (-129.1, -3, -1180.55),
        (-153.6, -3, -1345.9),
        (-152.1, -3, -781.9),
    ]]
    fillet(fillet2_edges, radius=FILLET2_R)


solid = part.part
